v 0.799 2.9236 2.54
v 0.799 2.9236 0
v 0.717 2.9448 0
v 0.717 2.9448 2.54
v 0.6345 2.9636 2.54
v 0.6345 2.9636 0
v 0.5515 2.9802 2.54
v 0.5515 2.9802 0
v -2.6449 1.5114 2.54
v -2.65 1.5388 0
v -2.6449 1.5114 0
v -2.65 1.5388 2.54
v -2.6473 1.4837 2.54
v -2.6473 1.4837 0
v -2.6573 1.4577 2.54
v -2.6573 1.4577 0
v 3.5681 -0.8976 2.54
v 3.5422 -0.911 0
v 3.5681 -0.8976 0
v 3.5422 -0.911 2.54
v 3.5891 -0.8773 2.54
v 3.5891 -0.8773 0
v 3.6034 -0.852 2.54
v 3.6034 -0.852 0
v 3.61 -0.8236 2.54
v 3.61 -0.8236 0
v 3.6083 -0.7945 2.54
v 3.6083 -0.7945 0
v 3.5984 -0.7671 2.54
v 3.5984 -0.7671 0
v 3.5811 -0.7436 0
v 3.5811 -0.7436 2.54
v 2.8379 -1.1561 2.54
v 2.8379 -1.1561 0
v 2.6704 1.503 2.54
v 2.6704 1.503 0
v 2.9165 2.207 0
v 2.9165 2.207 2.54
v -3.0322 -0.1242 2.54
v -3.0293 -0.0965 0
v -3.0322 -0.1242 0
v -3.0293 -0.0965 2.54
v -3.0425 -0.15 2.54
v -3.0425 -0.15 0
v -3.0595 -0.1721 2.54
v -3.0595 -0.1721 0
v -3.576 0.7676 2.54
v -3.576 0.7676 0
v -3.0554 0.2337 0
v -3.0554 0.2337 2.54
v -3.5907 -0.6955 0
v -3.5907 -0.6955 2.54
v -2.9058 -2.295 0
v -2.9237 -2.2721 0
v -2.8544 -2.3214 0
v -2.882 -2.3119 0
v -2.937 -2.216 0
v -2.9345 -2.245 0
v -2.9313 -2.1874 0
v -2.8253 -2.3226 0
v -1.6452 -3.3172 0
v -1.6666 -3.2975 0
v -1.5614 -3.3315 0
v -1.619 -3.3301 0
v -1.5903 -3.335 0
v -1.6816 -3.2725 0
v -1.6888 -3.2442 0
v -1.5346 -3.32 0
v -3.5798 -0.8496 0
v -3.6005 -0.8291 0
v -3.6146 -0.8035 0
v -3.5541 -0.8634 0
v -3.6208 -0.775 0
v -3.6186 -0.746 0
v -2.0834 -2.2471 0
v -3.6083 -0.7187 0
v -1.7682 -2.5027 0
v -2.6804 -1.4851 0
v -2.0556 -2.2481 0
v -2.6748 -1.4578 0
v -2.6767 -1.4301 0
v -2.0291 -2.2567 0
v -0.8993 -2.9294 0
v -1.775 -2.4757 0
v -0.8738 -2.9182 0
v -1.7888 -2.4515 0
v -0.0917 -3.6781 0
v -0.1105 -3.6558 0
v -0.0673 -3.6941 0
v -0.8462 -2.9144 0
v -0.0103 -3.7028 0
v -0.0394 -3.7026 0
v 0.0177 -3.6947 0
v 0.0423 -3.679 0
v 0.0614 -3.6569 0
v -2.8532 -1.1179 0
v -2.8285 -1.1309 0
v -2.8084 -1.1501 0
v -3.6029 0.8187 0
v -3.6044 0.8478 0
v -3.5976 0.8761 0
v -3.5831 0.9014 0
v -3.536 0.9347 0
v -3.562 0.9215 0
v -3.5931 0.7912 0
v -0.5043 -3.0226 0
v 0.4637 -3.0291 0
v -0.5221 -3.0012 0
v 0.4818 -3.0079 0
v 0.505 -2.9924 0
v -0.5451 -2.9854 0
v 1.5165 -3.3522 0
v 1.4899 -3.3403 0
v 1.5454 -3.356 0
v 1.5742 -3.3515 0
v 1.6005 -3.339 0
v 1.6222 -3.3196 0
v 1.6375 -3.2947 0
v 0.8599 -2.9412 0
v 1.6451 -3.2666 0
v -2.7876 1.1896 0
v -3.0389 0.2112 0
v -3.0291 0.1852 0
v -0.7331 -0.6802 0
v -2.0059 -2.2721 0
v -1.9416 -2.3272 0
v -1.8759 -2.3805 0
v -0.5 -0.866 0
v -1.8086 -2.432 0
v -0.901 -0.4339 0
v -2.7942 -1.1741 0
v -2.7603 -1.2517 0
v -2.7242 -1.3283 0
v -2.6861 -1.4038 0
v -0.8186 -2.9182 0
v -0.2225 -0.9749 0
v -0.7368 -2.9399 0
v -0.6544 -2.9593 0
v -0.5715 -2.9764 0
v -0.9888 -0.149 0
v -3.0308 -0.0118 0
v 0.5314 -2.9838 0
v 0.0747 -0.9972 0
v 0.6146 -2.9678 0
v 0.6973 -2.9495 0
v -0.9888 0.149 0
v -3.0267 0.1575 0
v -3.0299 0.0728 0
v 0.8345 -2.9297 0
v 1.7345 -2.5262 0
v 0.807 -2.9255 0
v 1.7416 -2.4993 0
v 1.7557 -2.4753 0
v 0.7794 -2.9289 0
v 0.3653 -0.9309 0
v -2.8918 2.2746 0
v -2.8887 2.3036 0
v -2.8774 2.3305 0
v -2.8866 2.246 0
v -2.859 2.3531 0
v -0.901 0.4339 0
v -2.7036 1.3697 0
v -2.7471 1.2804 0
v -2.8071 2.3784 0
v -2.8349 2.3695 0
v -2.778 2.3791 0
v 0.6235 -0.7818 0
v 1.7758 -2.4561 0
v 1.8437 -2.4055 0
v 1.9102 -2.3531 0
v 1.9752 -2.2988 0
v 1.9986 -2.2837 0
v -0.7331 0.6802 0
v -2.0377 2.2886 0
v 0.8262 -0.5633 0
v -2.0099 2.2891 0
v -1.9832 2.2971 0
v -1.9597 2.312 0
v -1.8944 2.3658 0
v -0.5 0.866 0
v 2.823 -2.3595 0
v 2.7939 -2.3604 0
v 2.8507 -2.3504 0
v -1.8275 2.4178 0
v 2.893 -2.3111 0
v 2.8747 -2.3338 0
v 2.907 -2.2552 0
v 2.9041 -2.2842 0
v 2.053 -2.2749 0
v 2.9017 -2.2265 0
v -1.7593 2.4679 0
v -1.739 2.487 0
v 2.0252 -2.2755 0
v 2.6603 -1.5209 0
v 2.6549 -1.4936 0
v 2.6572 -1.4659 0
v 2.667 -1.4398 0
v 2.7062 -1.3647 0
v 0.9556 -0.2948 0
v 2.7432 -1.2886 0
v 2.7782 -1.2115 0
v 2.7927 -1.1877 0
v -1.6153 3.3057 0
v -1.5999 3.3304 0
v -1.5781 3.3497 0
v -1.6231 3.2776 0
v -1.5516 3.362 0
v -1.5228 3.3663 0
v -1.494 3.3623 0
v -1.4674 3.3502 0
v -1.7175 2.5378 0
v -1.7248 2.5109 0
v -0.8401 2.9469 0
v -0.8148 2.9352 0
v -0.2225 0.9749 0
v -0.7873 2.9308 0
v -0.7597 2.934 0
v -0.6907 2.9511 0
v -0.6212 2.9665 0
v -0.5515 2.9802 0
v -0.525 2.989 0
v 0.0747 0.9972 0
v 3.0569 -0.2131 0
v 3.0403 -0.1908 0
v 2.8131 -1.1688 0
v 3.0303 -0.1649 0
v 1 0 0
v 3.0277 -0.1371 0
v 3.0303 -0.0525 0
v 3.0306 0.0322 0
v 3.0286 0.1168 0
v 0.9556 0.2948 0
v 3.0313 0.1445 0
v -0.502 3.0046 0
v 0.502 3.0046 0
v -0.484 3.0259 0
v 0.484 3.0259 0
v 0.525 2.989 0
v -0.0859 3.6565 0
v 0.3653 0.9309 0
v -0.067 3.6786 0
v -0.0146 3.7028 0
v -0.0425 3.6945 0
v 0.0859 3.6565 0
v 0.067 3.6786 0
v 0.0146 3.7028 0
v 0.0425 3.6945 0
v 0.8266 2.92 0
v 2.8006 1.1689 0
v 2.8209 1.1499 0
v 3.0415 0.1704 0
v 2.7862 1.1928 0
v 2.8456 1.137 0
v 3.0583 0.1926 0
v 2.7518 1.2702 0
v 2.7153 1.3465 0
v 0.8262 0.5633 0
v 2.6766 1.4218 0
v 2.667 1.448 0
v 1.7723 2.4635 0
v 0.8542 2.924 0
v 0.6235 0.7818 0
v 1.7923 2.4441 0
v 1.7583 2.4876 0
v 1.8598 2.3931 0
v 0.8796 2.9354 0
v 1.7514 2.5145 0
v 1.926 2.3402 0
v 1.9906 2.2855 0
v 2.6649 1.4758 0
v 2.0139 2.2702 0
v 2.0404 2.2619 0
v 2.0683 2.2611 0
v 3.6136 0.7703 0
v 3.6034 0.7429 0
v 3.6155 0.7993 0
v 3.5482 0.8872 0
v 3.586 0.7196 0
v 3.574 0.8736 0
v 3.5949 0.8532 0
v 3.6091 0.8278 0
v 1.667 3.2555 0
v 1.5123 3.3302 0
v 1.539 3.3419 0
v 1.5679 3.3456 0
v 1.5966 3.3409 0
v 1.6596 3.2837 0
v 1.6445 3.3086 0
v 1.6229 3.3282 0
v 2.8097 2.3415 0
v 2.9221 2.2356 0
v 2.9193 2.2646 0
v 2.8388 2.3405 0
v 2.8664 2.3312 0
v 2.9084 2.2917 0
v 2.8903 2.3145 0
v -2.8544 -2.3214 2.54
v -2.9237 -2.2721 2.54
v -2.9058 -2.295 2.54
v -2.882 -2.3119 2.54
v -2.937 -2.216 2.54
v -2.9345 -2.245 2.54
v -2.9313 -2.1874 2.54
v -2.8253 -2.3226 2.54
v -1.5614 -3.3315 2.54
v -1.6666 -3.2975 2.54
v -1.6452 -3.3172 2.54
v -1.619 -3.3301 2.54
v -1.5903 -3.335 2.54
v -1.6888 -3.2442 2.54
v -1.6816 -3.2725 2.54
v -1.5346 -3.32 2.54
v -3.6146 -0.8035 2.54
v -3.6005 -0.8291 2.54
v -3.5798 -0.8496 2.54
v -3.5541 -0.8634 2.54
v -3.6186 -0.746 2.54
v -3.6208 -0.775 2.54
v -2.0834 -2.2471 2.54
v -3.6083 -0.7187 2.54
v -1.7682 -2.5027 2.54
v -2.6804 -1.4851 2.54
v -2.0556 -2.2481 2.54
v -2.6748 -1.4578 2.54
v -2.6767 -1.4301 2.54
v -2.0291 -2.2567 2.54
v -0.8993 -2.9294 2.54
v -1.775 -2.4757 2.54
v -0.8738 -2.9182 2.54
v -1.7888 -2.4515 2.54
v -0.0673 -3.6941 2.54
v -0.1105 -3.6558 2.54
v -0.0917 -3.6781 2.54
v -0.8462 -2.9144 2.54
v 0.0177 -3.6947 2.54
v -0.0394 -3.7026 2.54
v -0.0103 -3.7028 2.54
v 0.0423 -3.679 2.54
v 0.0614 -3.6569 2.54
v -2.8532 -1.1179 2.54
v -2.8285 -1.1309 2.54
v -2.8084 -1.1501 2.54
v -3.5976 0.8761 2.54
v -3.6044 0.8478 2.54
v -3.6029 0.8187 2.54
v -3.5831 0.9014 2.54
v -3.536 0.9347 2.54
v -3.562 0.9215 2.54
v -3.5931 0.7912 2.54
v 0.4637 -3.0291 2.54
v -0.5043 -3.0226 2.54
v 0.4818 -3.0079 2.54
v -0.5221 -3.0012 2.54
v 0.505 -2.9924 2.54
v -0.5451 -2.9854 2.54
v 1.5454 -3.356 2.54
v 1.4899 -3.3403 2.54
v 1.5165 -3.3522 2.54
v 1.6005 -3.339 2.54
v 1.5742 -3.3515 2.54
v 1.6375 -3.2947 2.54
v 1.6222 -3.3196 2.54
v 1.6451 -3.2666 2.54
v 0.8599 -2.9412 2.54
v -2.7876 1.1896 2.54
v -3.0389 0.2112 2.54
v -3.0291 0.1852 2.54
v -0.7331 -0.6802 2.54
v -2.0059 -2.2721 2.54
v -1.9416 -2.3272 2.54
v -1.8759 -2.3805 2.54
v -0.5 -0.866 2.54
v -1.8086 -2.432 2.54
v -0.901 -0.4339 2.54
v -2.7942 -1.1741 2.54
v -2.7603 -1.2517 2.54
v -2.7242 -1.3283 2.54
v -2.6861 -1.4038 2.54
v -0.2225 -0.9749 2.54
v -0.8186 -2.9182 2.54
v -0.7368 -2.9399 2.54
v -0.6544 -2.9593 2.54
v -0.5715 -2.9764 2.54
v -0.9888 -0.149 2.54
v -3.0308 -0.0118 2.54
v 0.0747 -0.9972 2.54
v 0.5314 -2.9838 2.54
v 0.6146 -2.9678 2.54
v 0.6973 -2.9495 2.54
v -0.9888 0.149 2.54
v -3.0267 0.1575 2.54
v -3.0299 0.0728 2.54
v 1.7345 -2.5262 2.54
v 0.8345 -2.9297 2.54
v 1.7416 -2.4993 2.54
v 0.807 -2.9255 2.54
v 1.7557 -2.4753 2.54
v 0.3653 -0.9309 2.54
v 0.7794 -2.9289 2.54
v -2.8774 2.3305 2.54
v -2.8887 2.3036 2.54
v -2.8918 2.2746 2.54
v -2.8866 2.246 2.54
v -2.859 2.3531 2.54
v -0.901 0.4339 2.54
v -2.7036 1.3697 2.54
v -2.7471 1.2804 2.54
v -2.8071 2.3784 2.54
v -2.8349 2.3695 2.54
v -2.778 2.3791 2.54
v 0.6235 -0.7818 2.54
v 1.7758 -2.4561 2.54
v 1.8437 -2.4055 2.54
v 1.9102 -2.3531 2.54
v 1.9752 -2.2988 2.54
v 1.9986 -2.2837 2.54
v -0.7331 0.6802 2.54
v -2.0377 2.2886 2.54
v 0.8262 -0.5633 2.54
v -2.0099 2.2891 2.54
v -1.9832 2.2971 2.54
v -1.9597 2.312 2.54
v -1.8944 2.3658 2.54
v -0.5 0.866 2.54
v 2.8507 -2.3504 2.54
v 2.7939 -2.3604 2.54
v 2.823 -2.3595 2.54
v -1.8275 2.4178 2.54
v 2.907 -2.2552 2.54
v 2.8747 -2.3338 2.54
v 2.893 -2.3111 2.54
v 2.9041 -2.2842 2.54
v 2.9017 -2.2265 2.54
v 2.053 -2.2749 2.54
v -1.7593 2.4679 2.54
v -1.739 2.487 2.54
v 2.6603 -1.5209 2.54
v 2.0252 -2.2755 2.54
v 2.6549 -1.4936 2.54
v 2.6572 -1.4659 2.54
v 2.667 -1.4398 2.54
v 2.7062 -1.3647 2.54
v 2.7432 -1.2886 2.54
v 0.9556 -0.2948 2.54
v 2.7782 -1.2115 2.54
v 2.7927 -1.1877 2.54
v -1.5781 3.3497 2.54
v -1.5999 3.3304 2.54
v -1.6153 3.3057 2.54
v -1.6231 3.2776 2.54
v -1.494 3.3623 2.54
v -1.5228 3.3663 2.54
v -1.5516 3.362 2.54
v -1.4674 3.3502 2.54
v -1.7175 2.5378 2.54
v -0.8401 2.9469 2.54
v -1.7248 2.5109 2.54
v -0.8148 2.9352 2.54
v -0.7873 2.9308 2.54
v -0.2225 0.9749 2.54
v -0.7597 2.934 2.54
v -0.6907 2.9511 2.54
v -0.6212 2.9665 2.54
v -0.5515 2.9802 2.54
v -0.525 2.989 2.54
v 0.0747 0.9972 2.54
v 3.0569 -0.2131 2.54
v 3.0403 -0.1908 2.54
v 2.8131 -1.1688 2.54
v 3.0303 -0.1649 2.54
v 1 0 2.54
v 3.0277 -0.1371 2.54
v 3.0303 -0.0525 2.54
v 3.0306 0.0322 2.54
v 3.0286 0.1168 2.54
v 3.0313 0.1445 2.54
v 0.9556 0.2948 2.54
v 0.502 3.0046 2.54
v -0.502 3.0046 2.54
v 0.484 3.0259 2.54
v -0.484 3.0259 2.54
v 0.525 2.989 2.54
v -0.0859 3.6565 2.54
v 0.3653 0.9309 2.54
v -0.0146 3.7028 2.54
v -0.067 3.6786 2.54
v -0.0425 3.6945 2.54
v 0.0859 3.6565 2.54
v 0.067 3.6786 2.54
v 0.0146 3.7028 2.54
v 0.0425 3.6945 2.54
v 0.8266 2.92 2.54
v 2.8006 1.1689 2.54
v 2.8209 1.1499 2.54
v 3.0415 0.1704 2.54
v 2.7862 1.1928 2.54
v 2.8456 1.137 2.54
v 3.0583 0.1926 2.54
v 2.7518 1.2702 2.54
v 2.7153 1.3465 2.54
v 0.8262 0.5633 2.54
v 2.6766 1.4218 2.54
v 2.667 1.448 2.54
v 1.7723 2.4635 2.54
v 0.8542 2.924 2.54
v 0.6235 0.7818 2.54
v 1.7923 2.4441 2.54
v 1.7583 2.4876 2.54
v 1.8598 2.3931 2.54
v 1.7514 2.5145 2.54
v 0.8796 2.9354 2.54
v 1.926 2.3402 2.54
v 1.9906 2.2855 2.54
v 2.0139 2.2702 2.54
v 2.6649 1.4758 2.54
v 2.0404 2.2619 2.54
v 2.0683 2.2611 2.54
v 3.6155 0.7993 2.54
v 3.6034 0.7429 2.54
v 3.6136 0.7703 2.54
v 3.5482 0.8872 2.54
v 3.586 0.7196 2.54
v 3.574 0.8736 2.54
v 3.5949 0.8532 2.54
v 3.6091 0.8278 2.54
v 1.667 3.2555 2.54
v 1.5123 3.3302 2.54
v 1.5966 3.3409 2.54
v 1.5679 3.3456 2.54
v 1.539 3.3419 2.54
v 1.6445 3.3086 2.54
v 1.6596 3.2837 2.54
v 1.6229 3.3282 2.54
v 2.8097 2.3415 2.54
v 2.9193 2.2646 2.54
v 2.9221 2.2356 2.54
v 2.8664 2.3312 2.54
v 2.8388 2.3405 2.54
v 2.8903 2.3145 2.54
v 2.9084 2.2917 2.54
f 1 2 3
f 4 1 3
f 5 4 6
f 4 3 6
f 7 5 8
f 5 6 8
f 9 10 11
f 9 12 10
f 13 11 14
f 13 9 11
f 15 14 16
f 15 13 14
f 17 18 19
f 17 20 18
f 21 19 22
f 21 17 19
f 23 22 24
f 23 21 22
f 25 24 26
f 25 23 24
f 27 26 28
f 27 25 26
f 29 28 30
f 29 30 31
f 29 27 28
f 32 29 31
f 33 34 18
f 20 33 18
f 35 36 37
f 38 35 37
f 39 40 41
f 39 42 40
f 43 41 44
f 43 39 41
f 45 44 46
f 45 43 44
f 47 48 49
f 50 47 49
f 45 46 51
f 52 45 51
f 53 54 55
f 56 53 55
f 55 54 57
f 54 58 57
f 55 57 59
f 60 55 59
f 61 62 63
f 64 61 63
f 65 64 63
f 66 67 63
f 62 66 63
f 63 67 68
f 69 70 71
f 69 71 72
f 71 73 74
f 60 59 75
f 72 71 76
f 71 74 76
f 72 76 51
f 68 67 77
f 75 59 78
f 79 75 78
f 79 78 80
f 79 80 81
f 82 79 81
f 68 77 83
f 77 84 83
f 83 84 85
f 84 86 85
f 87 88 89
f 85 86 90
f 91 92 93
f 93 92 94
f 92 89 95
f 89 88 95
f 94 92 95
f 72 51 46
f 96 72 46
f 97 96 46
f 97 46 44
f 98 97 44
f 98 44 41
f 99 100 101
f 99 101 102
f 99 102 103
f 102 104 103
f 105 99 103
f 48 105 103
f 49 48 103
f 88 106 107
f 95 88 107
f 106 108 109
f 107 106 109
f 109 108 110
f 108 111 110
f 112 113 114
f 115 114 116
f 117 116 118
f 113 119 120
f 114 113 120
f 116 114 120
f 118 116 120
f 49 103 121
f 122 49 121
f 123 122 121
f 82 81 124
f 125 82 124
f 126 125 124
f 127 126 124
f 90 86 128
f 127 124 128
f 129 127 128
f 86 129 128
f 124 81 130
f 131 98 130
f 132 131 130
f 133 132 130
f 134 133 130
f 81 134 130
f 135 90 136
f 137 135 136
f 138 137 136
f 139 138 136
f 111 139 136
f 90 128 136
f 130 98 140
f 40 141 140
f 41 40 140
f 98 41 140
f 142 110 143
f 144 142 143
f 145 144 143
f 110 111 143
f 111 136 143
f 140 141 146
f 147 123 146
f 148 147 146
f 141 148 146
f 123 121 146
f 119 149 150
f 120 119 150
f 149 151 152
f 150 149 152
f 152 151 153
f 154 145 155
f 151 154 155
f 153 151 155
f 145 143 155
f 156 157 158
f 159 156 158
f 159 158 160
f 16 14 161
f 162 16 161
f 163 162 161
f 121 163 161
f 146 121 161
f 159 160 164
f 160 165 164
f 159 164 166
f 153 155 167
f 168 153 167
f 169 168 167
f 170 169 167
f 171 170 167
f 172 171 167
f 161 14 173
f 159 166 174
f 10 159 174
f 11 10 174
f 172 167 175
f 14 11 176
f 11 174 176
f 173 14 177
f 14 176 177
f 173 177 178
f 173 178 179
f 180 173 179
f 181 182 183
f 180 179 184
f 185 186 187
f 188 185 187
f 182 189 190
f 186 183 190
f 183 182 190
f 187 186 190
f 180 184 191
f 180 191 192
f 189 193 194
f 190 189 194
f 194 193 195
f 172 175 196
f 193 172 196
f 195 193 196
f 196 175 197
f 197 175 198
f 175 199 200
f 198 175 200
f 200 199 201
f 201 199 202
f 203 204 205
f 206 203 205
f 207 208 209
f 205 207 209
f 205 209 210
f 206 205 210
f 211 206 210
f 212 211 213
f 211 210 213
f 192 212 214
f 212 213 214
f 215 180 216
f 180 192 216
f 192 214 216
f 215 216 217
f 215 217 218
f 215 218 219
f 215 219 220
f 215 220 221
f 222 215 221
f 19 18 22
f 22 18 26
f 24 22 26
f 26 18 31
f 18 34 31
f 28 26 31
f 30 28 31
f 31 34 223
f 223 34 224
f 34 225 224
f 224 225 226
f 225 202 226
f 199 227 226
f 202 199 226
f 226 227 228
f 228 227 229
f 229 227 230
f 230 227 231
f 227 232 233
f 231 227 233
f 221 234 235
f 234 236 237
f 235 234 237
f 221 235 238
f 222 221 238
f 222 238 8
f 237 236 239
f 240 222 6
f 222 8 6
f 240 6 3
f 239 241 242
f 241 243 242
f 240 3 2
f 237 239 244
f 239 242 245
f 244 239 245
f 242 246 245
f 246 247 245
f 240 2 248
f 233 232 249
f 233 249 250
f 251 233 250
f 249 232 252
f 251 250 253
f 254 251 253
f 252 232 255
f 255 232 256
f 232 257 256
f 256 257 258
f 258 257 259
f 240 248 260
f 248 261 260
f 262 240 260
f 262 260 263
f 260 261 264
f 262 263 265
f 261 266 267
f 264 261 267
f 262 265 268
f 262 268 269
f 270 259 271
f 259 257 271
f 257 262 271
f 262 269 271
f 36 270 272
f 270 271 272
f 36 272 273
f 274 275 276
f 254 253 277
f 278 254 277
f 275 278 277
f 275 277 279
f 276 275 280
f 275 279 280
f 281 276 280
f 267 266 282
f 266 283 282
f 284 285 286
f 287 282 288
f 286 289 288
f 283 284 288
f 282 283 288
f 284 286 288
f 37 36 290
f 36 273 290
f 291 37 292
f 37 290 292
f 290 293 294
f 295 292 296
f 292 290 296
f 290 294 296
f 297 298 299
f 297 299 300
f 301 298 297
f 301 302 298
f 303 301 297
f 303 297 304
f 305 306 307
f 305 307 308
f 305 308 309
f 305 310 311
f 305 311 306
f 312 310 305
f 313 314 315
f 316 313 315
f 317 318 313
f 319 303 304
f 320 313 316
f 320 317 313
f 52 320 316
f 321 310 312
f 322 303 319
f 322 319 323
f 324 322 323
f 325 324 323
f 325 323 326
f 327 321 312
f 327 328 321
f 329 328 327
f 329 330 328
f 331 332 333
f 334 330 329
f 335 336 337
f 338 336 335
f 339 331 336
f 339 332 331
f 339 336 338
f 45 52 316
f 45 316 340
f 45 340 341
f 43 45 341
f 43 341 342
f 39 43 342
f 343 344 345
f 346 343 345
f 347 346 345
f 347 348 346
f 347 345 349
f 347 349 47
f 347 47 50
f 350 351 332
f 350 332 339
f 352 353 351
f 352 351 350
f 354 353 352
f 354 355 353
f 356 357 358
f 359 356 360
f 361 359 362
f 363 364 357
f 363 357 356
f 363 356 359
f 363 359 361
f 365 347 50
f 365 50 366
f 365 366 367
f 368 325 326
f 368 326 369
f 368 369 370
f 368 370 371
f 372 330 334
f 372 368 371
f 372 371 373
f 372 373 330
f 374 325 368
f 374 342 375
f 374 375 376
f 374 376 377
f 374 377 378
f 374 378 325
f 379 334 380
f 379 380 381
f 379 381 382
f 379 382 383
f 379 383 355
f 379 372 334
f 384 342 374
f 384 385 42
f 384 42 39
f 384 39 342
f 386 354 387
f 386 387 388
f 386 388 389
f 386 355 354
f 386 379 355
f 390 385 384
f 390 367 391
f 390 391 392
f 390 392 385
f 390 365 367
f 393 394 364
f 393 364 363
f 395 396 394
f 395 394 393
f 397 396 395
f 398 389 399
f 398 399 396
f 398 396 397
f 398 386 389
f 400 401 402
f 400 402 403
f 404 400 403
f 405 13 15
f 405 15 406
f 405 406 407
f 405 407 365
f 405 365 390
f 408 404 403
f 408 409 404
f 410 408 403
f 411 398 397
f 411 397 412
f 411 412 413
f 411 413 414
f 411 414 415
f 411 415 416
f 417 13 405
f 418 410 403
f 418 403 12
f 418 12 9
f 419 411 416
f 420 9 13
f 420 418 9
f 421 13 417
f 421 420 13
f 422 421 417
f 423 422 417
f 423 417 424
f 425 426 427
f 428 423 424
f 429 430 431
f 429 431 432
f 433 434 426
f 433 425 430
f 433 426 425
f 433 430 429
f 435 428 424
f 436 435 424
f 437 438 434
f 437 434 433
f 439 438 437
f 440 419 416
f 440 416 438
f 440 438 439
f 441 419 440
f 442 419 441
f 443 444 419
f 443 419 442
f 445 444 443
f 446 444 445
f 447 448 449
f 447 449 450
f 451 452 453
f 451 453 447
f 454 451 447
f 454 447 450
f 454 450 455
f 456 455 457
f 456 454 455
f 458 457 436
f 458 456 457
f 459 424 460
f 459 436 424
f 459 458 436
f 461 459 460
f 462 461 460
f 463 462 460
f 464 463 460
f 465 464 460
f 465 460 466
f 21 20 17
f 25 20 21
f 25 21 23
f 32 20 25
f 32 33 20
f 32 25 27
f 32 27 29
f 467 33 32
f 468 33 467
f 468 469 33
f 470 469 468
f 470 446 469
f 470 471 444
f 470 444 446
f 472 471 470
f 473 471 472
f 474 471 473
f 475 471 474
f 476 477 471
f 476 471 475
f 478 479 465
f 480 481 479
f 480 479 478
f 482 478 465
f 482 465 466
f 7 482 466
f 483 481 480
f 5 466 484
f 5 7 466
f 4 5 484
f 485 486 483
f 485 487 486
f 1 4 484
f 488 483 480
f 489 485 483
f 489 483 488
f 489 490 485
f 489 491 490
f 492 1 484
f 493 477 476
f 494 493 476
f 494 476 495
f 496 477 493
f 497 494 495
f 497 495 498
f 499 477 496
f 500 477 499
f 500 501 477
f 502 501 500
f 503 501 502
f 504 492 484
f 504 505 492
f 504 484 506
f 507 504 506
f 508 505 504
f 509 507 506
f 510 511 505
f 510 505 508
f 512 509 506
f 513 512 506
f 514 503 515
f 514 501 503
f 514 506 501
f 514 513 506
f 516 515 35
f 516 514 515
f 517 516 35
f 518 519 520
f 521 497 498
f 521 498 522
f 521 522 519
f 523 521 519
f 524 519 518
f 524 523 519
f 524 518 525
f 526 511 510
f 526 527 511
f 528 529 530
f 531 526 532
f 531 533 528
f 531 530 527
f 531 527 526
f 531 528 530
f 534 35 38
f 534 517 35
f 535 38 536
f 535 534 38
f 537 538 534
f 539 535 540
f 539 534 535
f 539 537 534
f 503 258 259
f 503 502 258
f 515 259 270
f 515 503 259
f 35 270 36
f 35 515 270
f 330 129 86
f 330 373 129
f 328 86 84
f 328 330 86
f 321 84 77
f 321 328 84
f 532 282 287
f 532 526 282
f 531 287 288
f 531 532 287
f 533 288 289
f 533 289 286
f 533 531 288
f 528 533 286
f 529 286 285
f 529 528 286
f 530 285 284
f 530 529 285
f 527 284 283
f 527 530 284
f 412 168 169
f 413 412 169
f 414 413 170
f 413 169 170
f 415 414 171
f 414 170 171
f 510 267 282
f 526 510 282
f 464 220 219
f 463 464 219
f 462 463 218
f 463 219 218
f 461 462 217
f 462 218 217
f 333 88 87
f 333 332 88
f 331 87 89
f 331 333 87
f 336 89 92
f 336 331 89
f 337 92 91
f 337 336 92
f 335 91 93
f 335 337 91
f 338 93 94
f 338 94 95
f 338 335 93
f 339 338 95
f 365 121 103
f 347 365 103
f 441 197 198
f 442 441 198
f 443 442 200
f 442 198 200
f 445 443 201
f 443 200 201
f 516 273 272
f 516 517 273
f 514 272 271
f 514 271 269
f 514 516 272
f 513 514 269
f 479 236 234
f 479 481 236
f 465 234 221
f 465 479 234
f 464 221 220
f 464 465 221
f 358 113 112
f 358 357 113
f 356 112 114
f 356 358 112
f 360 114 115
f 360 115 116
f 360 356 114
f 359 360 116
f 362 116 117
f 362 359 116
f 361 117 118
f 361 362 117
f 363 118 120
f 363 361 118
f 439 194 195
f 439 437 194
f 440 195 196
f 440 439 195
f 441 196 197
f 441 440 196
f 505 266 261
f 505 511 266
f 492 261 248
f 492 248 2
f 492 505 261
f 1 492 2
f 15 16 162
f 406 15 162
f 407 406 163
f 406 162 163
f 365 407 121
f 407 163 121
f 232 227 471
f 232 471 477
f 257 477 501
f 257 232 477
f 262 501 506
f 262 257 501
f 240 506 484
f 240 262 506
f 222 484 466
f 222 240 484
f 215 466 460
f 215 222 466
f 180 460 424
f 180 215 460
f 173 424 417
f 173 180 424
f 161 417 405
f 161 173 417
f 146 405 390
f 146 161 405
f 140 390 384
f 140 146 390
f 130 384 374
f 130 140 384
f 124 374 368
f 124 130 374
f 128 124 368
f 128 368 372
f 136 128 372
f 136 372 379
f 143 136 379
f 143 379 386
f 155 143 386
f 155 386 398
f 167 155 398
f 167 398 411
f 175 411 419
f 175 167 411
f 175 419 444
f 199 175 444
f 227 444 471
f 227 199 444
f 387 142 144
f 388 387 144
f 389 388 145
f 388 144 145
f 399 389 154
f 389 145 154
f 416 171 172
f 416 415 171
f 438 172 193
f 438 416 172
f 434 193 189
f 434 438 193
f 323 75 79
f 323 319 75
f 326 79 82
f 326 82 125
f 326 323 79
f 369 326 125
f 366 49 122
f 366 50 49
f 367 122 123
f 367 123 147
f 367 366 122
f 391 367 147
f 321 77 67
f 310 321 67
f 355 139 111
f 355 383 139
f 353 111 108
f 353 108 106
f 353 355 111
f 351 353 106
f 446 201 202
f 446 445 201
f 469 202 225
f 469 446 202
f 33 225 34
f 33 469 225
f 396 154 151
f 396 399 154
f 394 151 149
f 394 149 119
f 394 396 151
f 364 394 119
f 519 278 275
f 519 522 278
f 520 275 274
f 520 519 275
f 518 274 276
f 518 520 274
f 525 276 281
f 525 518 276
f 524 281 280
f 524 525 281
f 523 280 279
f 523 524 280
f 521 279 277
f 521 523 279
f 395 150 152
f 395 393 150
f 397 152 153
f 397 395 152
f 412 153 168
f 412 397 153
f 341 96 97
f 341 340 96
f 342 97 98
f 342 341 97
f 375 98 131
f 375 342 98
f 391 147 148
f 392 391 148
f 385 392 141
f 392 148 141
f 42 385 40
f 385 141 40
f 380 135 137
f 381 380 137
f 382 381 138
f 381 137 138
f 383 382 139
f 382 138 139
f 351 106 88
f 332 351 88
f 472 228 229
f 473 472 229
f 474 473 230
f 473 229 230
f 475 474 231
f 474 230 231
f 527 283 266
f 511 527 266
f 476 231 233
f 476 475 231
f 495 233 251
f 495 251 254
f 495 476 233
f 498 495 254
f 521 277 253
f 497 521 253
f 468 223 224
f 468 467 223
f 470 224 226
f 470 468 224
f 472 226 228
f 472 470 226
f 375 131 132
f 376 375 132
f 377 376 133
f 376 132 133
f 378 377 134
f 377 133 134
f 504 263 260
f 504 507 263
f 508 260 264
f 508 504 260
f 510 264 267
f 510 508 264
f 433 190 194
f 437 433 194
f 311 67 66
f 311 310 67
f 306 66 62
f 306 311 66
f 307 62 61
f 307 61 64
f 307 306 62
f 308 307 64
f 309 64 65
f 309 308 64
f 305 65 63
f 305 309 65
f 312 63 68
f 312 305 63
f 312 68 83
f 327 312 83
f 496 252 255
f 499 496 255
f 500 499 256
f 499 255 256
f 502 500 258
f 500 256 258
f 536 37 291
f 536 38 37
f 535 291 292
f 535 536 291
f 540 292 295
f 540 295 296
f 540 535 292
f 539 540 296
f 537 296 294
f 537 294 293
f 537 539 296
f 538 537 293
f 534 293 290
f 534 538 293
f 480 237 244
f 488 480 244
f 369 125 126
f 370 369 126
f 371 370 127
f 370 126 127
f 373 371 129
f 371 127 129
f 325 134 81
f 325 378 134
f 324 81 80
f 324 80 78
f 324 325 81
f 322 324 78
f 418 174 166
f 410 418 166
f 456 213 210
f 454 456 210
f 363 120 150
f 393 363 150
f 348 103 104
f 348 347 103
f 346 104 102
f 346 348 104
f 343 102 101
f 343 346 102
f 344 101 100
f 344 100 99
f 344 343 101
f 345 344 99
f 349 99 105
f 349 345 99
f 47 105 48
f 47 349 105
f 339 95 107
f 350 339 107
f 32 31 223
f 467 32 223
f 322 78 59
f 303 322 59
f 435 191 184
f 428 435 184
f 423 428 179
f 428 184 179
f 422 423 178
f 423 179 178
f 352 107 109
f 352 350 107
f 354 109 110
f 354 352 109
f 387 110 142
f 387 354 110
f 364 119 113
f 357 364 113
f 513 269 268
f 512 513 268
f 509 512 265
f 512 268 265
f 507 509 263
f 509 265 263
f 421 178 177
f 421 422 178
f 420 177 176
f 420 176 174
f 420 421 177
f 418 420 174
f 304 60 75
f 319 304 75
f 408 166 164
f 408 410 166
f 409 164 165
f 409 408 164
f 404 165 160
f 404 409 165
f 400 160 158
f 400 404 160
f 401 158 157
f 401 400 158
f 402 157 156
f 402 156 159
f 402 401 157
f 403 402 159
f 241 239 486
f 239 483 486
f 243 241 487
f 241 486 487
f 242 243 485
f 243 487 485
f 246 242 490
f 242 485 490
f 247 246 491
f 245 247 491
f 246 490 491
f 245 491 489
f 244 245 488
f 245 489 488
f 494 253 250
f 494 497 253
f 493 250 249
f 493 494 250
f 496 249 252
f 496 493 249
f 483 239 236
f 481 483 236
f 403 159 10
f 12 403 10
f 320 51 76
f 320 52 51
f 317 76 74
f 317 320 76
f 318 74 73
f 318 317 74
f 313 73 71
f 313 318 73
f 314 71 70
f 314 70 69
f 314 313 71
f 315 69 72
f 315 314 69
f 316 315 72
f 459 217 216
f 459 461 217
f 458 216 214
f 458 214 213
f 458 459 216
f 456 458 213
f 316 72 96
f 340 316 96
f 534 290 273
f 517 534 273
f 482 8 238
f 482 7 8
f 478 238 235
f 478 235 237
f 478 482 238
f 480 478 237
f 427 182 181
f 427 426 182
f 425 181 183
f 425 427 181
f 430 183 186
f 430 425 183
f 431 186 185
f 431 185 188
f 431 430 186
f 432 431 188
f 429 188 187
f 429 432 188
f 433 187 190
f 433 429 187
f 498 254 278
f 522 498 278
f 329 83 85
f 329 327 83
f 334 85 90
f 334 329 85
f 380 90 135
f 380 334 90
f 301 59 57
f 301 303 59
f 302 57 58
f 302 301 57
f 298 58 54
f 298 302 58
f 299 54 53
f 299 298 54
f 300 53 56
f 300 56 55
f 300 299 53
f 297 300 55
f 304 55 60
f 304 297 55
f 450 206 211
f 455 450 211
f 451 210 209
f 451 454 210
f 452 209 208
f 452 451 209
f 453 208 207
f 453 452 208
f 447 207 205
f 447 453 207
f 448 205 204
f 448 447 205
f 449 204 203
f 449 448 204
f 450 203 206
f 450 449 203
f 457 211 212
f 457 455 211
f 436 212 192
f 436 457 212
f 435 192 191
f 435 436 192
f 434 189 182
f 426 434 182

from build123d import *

# Parameters (mm, degrees)
F0_R     = 1.000001
F1_DEPTH = 2.54
F2_R     = 0.1016


with BuildPart() as f1:
    # F0 (on Top) → F1 (new body)
    with BuildSketch(Plane.XY):
        with BuildLine():
            Line((0, 3.792523), (-0.508, 2.987927))
            ThreePointArc((-0.508, 2.987927), (-0.655986, 2.958962), (-0.802348, 2.922672))
            ThreePointArc((-0.802348, 2.922672), (-1.280873, 2.746841), (-1.723157, 2.493292))
            ThreePointArc((-1.723157, 2.493292), (-1.861136, 2.392059), (-1.993181, 2.2832))
            ThreePointArc((-1.993181, 2.2832), (-2.347676, 1.916818), (-2.635746, 1.496202))
            ThreePointArc((-2.635746, 1.496202), (-2.715992, 1.34505), (-2.78758, 1.189611))
            ThreePointArc((-2.78758, 1.189611), (-2.947537, 0.705549), (-3.024097, 0.201524))
            ThreePointArc((-3.024097, 0.201524), (-3.030651, 0.030517), (-3.027542, -0.140587))
            ThreePointArc((-3.027542, -0.140587), (-2.961147, -0.646051), (-2.81097, -1.133236))
            ThreePointArc((-2.81097, -1.133236), (-2.742527, -1.290085), (-2.66534, -1.442822))
            ThreePointArc((-2.66534, -1.442822), (-2.385799, -1.869154), (-2.038754, -2.2426))
            ThreePointArc((-2.038754, -2.2426), (-1.908928, -2.354096), (-1.773015, -2.458087))
            ThreePointArc((-1.773015, -2.458087), (-1.335927, -2.720491), (-0.86104, -2.905922))
            ThreePointArc((-0.86104, -2.905922), (-0.695652, -2.949889), (-0.528046, -2.98445))
            ThreePointArc((-0.528046, -2.98445), (-0.020345, -3.030736), (0.487931, -2.99127))
            ThreePointArc((0.487931, -2.99127), (0.655986, -2.958962), (0.821949, -2.91722))
            ThreePointArc((0.821949, -2.91722), (1.299283, -2.738181), (1.739855, -2.481668))
            ThreePointArc((1.739855, -2.481668), (1.877151, -2.379512), (2.008463, -2.269769))
            ThreePointArc((2.008463, -2.269769), (2.36049, -1.901016), (2.64573, -1.478475))
            ThreePointArc((2.64573, -1.478475), (2.72496, -1.326788), (2.795502, -1.170872))
            ThreePointArc((2.795502, -1.170872), (2.952207, -0.685747), (3.025382, -0.181219))
            ThreePointArc((3.025382, -0.181219), (3.030787, -0.010173), (3.02653, 0.160907))
            ThreePointArc((3.02653, 0.160907), (2.956744, 0.665914), (2.803299, 1.15208))
            ThreePointArc((2.803299, 1.15208), (2.733805, 1.308466), (2.655595, 1.460681))
            ThreePointArc((2.655595, 1.460681), (2.373198, 1.885127), (2.023654, 2.256236))
            ThreePointArc((2.023654, 2.256236), (1.893082, 2.366857), (1.756475, 2.469933))
            ThreePointArc((1.756475, 2.469933), (1.317635, 2.729398), (0.841513, 2.911637))
            ThreePointArc((0.841513, 2.911637), (0.675834, 2.954492), (0.508, 2.987927))
            Line((0.508, 2.987927), (0, 3.792523))
        make_face()
        Circle(F0_R, mode=Mode.SUBTRACT)
        with BuildLine():
            Line((1.64879, 3.415366), (0.841513, 2.911637))
            ThreePointArc((0.841513, 2.911637), (1.317635, 2.729398), (1.756475, 2.469933))
            Line((1.756475, 2.469933), (1.64879, 3.415366))
        make_face()
        with BuildLine():
            ThreePointArc((-1.723157, 2.493292), (-1.280873, 2.746841), (-0.802348, 2.922672))
            Line((-0.802348, 2.922672), (-1.60279, 3.437193))
            Line((-1.60279, 3.437193), (-1.723157, 2.493292))
        make_face()
        with BuildLine():
            ThreePointArc((-2.635746, 1.496202), (-2.347676, 1.916818), (-1.993181, 2.2832))
            Line((-1.993181, 2.2832), (-2.937707, 2.398564))
            Line((-2.937707, 2.398564), (-2.635746, 1.496202))
        make_face()
        with BuildLine():
            ThreePointArc((-3.024097, 0.201524), (-2.947537, 0.705549), (-2.78758, 1.189611))
            Line((-2.78758, 1.189611), (-3.688329, 0.882871))
            Line((-3.688329, 0.882871), (-3.024097, 0.201524))
        make_face()
        with BuildLine():
            ThreePointArc((-2.81097, -1.133236), (-2.961147, -0.646051), (-3.027542, -0.140587))
            Line((-3.027542, -0.140587), (-3.705359, -0.80842))
            Line((-3.705359, -0.80842), (-2.81097, -1.133236))
        make_face()
        with BuildLine():
            ThreePointArc((-2.038754, -2.2426), (-2.385799, -1.869154), (-2.66534, -1.442822))
            Line((-2.66534, -1.442822), (-2.985412, -2.338921))
            Line((-2.985412, -2.338921), (-2.038754, -2.2426))
        make_face()
        with BuildLine():
            ThreePointArc((-0.86104, -2.905922), (-1.335927, -2.720491), (-1.773015, -2.458087))
            Line((-1.773015, -2.458087), (-1.67168, -3.404221))
            Line((-1.67168, -3.404221), (-0.86104, -2.905922))
        make_face()
        with BuildLine():
            ThreePointArc((0.487931, -2.99127), (-0.020345, -3.030736), (-0.528046, -2.98445))
            Line((-0.528046, -2.98445), (-0.025458, -3.792438))
            Line((-0.025458, -3.792438), (0.487931, -2.99127))
        make_face()
        with BuildLine():
            Line((1.625826, -3.426357), (1.739855, -2.481668))
            ThreePointArc((1.739855, -2.481668), (1.299283, -2.738181), (0.821949, -2.91722))
            Line((0.821949, -2.91722), (1.625826, -3.426357))
        make_face()
        with BuildLine():
            Line((2.953742, -2.37879), (2.64573, -1.478475))
            ThreePointArc((2.64573, -1.478475), (2.36049, -1.901016), (2.008463, -2.269769))
            Line((2.008463, -2.269769), (2.953742, -2.37879))
        make_face()
        with BuildLine():
            Line((3.694172, -0.858093), (3.025382, -0.181219))
            ThreePointArc((3.025382, -0.181219), (2.952207, -0.685747), (2.795502, -1.170872))
            Line((2.795502, -1.170872), (3.694172, -0.858093))
        make_face()
        with BuildLine():
            Line((3.699849, 0.833275), (2.803299, 1.15208))
            ThreePointArc((2.803299, 1.15208), (2.956744, 0.665914), (3.02653, 0.160907))
            Line((3.02653, 0.160907), (3.699849, 0.833275))
        make_face()
        with BuildLine():
            Line((2.969644, 2.358908), (2.023654, 2.256236))
            ThreePointArc((2.023654, 2.256236), (2.373198, 1.885127), (2.655595, 1.460681))
            Line((2.655595, 1.460681), (2.969644, 2.358908))
        make_face()
    extrude(amount=F1_DEPTH)

    # F2
    f2_edges = [f1.edges().sort_by_distance(p)[0] for p in [
        (0, 3.792523, 1.27),
        (-1.60279, 3.437193, 1.27),
        (-2.937707, 2.398564, 1.27),
        (-3.688329, 0.882871, 1.27),
        (-3.705359, -0.80842, 1.27),
        (-2.985412, -2.338921, 1.27),
        (-1.67168, -3.404221, 1.27),
        (-0.025458, -3.792438, 1.27),
        (1.625826, -3.426357, 1.27),
        (2.953742, -2.37879, 1.27),
        (3.694172, -0.858093, 1.27),
        (3.699849, 0.833275, 1.27),
        (2.969644, 2.358908, 1.27),
        (1.64879, 3.415366, 1.27),
        (0.508, 2.987927, 1.27),
        (0.841513, 2.911637, 1.27),
        (1.756475, 2.469933, 1.27),
        (2.023654, 2.256236, 1.27),
        (2.655595, 1.460681, 1.27),
        (2.803299, 1.15208, 1.27),
        (3.02653, 0.160907, 1.27),
        (3.025382, -0.181219, 1.27),
        (2.795502, -1.170872, 1.27),
        (2.64573, -1.478475, 1.27),
        (2.008463, -2.269769, 1.27),
        (1.739855, -2.481668, 1.27),
        (0.821949, -2.91722, 1.27),
        (0.487931, -2.99127, 1.27),
        (-0.528046, -2.98445, 1.27),
        (-0.86104, -2.905922, 1.27),
        (-1.773015, -2.458087, 1.27),
        (-2.038754, -2.2426, 1.27),
        (-2.66534, -1.442822, 1.27),
        (-2.81097, -1.133236, 1.27),
        (-3.027542, -0.140587, 1.27),
        (-3.024097, 0.201524, 1.27),
        (-2.635746, 1.496202, 1.27),
        (-1.723157, 2.493292, 1.27),
        (-1.993181, 2.2832, 1.27),
        (-0.802348, 2.922672, 1.27),
        (-0.508, 2.987927, 1.27),
    ]]
    fillet(f2_edges, radius=F2_R)


solid = f1.part
